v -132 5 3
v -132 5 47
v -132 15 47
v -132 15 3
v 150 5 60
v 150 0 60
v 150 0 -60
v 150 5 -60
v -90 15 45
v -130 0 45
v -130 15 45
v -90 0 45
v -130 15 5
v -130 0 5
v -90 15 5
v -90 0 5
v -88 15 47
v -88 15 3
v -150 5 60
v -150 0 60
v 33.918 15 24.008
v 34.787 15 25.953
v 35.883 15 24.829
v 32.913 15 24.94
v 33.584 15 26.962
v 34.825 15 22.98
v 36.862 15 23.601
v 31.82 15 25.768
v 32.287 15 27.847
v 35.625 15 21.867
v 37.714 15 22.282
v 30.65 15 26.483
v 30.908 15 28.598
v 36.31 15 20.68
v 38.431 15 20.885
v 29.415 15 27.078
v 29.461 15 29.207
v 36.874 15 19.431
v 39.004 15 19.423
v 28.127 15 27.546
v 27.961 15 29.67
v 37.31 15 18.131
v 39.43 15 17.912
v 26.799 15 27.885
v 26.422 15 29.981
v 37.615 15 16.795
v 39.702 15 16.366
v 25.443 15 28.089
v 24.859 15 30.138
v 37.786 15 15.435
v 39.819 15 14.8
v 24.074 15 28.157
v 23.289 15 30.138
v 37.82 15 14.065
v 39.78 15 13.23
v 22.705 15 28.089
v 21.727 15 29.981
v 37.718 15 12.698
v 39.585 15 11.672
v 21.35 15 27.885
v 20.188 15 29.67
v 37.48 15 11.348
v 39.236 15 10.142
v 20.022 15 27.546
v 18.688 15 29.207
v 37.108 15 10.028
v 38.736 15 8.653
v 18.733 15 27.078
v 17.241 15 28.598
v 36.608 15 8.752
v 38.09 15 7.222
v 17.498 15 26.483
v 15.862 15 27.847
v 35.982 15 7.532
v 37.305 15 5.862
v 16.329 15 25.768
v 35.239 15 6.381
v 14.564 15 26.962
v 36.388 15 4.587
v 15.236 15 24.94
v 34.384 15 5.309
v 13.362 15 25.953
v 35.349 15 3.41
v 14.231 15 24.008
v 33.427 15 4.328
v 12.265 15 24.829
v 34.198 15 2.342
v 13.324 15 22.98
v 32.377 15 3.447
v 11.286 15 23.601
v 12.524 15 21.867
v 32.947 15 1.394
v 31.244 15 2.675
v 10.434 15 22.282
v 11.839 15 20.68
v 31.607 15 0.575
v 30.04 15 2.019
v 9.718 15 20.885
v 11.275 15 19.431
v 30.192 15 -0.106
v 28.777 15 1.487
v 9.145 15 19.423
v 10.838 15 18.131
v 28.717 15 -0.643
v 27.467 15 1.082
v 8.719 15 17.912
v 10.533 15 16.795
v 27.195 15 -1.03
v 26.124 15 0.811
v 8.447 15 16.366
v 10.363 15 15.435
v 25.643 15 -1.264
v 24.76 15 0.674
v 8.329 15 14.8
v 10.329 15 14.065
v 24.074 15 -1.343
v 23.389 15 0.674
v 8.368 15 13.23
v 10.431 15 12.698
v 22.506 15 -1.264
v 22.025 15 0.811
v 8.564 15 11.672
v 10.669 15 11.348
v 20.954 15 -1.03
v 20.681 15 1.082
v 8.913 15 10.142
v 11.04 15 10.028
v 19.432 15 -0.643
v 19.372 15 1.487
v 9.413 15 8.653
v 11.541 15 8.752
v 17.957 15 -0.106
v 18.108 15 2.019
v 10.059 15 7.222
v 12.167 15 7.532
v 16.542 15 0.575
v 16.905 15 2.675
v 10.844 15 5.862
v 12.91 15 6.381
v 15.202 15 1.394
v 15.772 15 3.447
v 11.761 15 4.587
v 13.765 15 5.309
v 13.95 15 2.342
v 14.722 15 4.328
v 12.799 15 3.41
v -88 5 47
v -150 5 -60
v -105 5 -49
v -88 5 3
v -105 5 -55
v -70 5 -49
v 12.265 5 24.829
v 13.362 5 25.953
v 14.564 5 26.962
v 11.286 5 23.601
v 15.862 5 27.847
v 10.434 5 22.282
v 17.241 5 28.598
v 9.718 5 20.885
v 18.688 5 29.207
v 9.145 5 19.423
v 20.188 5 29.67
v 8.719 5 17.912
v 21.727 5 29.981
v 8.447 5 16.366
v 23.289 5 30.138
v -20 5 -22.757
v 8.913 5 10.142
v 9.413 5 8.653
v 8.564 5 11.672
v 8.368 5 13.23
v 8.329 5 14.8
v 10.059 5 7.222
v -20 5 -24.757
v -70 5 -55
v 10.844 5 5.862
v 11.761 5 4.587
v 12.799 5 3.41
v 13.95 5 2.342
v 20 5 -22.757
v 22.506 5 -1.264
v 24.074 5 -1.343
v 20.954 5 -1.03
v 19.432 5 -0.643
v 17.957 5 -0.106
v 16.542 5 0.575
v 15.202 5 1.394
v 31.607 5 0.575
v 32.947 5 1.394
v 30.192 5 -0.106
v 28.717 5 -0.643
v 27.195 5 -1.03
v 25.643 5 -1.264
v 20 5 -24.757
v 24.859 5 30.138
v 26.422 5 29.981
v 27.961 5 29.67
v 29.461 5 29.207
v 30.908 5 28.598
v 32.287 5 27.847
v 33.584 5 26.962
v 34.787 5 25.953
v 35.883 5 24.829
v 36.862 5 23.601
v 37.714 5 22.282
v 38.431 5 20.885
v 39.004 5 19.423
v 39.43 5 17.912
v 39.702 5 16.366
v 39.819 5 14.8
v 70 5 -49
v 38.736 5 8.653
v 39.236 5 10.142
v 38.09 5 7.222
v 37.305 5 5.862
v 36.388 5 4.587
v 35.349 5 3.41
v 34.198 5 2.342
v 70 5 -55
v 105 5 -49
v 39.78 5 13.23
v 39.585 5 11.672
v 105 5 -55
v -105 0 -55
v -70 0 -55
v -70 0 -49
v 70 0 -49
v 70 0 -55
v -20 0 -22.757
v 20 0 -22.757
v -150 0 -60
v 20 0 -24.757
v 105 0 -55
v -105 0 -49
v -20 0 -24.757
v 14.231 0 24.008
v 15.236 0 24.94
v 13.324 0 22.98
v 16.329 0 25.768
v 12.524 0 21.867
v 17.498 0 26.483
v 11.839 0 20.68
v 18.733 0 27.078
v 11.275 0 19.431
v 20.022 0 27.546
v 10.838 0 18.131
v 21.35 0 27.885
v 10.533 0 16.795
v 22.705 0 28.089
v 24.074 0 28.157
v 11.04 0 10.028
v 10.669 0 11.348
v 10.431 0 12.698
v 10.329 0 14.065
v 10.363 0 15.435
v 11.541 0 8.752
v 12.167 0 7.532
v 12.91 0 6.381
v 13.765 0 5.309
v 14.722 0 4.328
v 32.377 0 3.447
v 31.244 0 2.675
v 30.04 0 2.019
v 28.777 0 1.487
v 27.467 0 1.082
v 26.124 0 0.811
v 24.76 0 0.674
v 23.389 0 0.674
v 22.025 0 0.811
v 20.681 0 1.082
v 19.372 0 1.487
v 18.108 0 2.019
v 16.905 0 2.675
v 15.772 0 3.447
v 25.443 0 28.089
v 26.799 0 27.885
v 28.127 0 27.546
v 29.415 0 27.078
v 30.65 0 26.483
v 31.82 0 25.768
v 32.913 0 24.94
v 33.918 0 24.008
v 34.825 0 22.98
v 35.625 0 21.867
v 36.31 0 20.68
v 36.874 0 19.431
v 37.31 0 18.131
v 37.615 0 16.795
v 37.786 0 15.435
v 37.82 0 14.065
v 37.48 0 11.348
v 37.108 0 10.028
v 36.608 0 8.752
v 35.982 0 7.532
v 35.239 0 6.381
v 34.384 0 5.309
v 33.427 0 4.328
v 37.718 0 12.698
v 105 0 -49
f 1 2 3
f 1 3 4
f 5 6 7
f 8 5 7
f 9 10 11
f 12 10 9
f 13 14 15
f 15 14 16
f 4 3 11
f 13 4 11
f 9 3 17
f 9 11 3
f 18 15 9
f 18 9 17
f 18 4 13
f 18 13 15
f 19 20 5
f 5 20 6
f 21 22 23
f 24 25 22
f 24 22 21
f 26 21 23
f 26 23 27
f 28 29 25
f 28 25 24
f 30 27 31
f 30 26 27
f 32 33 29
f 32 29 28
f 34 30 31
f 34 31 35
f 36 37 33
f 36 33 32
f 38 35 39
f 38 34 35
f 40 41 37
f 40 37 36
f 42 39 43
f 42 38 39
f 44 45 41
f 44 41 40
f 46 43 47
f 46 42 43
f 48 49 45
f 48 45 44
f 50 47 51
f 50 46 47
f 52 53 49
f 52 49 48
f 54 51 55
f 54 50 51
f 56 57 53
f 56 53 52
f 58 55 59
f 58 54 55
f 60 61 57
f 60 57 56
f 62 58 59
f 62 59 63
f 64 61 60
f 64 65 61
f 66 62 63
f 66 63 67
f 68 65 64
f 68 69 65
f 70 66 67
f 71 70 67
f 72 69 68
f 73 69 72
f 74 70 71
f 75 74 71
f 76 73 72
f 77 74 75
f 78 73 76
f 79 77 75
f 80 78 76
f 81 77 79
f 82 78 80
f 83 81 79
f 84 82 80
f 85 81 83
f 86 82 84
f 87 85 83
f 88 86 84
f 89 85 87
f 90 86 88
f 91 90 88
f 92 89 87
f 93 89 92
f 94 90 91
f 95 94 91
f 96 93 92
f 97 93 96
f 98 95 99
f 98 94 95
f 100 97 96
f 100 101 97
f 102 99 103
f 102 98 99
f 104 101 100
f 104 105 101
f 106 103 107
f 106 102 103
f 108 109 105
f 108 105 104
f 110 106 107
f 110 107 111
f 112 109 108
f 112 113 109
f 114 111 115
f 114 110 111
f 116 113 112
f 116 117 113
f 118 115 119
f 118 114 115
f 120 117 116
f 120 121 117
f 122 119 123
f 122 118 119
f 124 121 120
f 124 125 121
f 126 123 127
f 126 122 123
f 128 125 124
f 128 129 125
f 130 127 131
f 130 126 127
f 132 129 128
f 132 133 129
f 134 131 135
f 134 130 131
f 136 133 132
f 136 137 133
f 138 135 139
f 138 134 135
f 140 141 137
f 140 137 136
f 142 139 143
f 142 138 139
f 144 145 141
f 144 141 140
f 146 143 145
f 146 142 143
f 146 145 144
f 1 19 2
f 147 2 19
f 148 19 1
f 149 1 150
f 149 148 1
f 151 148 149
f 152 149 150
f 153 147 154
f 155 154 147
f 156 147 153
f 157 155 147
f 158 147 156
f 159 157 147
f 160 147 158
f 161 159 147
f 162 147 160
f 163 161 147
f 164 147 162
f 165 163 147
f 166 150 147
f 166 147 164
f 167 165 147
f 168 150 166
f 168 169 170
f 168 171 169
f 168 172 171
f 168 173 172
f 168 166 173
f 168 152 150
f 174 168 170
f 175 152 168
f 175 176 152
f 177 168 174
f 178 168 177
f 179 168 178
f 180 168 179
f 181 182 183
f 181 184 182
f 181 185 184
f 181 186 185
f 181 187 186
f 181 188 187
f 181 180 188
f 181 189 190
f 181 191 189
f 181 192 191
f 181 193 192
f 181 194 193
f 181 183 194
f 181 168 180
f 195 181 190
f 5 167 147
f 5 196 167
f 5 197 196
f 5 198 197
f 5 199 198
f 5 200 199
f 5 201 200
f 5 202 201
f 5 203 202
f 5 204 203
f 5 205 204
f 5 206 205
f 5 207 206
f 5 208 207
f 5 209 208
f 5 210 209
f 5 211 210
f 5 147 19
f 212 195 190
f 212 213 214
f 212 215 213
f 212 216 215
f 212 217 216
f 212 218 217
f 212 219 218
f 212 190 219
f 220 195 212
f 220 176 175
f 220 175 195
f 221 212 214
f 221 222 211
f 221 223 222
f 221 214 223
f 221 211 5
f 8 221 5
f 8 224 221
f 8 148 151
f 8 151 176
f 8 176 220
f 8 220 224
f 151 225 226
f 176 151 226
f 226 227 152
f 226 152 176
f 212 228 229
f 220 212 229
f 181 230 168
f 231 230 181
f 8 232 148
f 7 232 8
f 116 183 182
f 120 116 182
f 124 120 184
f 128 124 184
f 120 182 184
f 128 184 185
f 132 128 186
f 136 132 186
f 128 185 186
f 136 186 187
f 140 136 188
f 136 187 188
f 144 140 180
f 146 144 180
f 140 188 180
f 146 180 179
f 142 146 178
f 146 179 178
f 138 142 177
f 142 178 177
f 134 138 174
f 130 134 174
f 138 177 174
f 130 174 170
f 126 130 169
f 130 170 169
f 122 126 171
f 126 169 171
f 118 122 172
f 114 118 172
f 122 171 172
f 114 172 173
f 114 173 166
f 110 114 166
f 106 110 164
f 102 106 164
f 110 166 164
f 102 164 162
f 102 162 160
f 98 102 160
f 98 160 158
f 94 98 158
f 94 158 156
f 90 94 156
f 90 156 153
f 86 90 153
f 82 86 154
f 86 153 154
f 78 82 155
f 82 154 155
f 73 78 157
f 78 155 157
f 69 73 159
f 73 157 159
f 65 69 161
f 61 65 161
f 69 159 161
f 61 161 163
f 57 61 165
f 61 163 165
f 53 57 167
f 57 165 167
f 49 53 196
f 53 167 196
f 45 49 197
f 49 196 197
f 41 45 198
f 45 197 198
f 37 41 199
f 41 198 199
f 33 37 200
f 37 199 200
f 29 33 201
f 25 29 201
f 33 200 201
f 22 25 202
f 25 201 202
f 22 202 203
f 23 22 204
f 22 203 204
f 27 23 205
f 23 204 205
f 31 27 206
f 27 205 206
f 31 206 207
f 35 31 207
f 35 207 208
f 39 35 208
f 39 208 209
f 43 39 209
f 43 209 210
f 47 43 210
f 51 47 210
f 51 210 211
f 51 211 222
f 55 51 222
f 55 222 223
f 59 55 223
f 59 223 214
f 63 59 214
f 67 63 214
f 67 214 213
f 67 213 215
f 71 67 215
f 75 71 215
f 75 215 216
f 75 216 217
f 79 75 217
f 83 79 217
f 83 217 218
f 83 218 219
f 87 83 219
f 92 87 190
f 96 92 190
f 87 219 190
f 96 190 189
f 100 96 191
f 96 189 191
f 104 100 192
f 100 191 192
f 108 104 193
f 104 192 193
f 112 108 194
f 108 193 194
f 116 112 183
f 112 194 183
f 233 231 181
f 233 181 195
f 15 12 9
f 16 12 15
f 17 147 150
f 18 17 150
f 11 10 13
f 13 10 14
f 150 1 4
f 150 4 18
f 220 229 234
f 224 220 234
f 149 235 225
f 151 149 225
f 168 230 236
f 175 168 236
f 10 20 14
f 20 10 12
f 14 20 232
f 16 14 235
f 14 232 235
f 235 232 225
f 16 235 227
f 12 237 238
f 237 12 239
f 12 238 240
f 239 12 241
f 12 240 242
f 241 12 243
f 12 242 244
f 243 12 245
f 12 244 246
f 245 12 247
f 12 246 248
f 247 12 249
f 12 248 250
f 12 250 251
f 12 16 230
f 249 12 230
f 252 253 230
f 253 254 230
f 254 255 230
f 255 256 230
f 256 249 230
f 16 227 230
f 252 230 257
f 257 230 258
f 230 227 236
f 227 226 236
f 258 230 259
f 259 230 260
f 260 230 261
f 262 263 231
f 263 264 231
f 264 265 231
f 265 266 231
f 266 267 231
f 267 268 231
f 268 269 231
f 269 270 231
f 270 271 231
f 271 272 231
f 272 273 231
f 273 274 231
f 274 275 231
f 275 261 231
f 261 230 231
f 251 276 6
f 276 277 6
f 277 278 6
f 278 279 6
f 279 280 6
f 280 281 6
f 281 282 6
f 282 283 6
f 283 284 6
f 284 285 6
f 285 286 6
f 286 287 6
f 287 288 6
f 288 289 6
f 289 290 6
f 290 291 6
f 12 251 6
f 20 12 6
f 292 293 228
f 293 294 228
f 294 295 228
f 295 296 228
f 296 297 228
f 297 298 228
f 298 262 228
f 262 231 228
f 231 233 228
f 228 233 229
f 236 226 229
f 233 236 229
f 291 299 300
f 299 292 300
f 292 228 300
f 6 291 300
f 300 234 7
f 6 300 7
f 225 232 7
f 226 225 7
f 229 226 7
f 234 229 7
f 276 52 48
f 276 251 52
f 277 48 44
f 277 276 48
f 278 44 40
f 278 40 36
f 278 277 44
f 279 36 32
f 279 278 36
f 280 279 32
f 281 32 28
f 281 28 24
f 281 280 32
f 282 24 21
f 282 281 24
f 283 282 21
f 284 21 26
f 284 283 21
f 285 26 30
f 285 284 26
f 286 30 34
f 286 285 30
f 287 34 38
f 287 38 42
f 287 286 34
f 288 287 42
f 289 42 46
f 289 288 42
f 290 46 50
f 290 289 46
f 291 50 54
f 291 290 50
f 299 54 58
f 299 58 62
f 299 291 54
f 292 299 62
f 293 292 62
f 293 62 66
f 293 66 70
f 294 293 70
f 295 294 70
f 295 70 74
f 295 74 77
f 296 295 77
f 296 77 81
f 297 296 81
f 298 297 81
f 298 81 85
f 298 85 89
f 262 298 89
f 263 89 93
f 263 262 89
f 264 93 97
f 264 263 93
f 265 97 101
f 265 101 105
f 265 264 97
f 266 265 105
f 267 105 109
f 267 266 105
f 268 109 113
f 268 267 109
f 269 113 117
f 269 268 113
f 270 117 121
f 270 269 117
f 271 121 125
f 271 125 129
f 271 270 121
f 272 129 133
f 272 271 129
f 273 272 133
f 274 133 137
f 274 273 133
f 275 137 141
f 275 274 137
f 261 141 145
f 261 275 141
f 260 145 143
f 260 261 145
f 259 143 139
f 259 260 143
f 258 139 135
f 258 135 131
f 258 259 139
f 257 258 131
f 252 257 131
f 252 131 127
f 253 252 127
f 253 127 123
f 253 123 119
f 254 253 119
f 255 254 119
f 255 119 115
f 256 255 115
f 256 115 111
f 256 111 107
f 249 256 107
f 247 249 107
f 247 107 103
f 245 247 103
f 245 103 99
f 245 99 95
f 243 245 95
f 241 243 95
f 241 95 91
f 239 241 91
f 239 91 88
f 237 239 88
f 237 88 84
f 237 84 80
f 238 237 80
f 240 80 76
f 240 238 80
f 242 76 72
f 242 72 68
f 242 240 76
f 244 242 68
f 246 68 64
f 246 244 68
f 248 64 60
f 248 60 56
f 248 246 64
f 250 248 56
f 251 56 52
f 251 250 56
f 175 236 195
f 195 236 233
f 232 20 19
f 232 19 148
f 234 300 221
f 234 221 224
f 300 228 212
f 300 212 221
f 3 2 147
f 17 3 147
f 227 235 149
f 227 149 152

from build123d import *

# Parameters (mm, degrees)
SKETCH1_W           = 300
SKETCH1_H           = 120
SKETCH1_R           = 13.75
SKETCH1_W_2         = 35
SKETCH1_H_2         = 6
SKETCH1_W_3         = 40
SKETCH1_H_3         = 40
SKETCH1_H_4         = 2
BOSS_EXTRUDE1_DEPTH = 5
SKETCH3_R           = 15.75
SKETCH3_R_2         = 13.75
SKETCH3_W           = 44
SKETCH3_H           = 44
SKETCH3_W_2         = 40
SKETCH3_H_2         = 40
BOSS_EXTRUDE5_DEPTH = 10


with BuildPart() as part:
    # Sketch1 → Boss-Extrude1 (new body)
    with BuildSketch(Plane(origin=(0, 0, 0), x_dir=(1, 0, 0), z_dir=(0, 1, 0))):
        Rectangle(SKETCH1_W, SKETCH1_H)
        with Locations(Location((24.074387053, -14.407309066, 0), (0, 0, 270))):
            Circle(SKETCH1_R, mode=Mode.SUBTRACT)
        with Locations((-87.5, 52)):
            Rectangle(SKETCH1_W_2, SKETCH1_H_2, mode=Mode.SUBTRACT)
        with Locations((87.5, 52)):
            Rectangle(SKETCH1_W_2, SKETCH1_H_2, mode=Mode.SUBTRACT)
        with Locations((-110, -25)):
            Rectangle(SKETCH1_W_3, SKETCH1_H_3, mode=Mode.SUBTRACT)
        with Locations((0, 23.756786453)):
            Rectangle(SKETCH1_W_3, SKETCH1_H_4, mode=Mode.SUBTRACT)
    extrude(amount=BOSS_EXTRUDE1_DEPTH)

    # Sketch3 → Boss-Extrude5 (add)
    # profile 1 of 2: a face of its own
    with BuildSketch(Plane(origin=(0, 5, 0), x_dir=(1, 0, 0), z_dir=(0, 1, 0))):
        with Locations(Location((24.074387053, -14.407309066, 0), (0, 0, 90))):
            Circle(SKETCH3_R)
        with Locations(Location((24.074387053, -14.407309066, 0), (0, 0, 270))):
            Circle(SKETCH3_R_2, mode=Mode.SUBTRACT)
    # profile 2 of 2: a face of its own
    with BuildSketch(Plane(origin=(0, 5, 0), x_dir=(1, 0, 0), z_dir=(0, 1, 0))):
        with Locations((-110, -25)):
            Rectangle(SKETCH3_W, SKETCH3_H)
        with Locations((-110, -25)):
            Rectangle(SKETCH3_W_2, SKETCH3_H_2, mode=Mode.SUBTRACT)
    extrude(amount=BOSS_EXTRUDE5_DEPTH)


solid = part.part
